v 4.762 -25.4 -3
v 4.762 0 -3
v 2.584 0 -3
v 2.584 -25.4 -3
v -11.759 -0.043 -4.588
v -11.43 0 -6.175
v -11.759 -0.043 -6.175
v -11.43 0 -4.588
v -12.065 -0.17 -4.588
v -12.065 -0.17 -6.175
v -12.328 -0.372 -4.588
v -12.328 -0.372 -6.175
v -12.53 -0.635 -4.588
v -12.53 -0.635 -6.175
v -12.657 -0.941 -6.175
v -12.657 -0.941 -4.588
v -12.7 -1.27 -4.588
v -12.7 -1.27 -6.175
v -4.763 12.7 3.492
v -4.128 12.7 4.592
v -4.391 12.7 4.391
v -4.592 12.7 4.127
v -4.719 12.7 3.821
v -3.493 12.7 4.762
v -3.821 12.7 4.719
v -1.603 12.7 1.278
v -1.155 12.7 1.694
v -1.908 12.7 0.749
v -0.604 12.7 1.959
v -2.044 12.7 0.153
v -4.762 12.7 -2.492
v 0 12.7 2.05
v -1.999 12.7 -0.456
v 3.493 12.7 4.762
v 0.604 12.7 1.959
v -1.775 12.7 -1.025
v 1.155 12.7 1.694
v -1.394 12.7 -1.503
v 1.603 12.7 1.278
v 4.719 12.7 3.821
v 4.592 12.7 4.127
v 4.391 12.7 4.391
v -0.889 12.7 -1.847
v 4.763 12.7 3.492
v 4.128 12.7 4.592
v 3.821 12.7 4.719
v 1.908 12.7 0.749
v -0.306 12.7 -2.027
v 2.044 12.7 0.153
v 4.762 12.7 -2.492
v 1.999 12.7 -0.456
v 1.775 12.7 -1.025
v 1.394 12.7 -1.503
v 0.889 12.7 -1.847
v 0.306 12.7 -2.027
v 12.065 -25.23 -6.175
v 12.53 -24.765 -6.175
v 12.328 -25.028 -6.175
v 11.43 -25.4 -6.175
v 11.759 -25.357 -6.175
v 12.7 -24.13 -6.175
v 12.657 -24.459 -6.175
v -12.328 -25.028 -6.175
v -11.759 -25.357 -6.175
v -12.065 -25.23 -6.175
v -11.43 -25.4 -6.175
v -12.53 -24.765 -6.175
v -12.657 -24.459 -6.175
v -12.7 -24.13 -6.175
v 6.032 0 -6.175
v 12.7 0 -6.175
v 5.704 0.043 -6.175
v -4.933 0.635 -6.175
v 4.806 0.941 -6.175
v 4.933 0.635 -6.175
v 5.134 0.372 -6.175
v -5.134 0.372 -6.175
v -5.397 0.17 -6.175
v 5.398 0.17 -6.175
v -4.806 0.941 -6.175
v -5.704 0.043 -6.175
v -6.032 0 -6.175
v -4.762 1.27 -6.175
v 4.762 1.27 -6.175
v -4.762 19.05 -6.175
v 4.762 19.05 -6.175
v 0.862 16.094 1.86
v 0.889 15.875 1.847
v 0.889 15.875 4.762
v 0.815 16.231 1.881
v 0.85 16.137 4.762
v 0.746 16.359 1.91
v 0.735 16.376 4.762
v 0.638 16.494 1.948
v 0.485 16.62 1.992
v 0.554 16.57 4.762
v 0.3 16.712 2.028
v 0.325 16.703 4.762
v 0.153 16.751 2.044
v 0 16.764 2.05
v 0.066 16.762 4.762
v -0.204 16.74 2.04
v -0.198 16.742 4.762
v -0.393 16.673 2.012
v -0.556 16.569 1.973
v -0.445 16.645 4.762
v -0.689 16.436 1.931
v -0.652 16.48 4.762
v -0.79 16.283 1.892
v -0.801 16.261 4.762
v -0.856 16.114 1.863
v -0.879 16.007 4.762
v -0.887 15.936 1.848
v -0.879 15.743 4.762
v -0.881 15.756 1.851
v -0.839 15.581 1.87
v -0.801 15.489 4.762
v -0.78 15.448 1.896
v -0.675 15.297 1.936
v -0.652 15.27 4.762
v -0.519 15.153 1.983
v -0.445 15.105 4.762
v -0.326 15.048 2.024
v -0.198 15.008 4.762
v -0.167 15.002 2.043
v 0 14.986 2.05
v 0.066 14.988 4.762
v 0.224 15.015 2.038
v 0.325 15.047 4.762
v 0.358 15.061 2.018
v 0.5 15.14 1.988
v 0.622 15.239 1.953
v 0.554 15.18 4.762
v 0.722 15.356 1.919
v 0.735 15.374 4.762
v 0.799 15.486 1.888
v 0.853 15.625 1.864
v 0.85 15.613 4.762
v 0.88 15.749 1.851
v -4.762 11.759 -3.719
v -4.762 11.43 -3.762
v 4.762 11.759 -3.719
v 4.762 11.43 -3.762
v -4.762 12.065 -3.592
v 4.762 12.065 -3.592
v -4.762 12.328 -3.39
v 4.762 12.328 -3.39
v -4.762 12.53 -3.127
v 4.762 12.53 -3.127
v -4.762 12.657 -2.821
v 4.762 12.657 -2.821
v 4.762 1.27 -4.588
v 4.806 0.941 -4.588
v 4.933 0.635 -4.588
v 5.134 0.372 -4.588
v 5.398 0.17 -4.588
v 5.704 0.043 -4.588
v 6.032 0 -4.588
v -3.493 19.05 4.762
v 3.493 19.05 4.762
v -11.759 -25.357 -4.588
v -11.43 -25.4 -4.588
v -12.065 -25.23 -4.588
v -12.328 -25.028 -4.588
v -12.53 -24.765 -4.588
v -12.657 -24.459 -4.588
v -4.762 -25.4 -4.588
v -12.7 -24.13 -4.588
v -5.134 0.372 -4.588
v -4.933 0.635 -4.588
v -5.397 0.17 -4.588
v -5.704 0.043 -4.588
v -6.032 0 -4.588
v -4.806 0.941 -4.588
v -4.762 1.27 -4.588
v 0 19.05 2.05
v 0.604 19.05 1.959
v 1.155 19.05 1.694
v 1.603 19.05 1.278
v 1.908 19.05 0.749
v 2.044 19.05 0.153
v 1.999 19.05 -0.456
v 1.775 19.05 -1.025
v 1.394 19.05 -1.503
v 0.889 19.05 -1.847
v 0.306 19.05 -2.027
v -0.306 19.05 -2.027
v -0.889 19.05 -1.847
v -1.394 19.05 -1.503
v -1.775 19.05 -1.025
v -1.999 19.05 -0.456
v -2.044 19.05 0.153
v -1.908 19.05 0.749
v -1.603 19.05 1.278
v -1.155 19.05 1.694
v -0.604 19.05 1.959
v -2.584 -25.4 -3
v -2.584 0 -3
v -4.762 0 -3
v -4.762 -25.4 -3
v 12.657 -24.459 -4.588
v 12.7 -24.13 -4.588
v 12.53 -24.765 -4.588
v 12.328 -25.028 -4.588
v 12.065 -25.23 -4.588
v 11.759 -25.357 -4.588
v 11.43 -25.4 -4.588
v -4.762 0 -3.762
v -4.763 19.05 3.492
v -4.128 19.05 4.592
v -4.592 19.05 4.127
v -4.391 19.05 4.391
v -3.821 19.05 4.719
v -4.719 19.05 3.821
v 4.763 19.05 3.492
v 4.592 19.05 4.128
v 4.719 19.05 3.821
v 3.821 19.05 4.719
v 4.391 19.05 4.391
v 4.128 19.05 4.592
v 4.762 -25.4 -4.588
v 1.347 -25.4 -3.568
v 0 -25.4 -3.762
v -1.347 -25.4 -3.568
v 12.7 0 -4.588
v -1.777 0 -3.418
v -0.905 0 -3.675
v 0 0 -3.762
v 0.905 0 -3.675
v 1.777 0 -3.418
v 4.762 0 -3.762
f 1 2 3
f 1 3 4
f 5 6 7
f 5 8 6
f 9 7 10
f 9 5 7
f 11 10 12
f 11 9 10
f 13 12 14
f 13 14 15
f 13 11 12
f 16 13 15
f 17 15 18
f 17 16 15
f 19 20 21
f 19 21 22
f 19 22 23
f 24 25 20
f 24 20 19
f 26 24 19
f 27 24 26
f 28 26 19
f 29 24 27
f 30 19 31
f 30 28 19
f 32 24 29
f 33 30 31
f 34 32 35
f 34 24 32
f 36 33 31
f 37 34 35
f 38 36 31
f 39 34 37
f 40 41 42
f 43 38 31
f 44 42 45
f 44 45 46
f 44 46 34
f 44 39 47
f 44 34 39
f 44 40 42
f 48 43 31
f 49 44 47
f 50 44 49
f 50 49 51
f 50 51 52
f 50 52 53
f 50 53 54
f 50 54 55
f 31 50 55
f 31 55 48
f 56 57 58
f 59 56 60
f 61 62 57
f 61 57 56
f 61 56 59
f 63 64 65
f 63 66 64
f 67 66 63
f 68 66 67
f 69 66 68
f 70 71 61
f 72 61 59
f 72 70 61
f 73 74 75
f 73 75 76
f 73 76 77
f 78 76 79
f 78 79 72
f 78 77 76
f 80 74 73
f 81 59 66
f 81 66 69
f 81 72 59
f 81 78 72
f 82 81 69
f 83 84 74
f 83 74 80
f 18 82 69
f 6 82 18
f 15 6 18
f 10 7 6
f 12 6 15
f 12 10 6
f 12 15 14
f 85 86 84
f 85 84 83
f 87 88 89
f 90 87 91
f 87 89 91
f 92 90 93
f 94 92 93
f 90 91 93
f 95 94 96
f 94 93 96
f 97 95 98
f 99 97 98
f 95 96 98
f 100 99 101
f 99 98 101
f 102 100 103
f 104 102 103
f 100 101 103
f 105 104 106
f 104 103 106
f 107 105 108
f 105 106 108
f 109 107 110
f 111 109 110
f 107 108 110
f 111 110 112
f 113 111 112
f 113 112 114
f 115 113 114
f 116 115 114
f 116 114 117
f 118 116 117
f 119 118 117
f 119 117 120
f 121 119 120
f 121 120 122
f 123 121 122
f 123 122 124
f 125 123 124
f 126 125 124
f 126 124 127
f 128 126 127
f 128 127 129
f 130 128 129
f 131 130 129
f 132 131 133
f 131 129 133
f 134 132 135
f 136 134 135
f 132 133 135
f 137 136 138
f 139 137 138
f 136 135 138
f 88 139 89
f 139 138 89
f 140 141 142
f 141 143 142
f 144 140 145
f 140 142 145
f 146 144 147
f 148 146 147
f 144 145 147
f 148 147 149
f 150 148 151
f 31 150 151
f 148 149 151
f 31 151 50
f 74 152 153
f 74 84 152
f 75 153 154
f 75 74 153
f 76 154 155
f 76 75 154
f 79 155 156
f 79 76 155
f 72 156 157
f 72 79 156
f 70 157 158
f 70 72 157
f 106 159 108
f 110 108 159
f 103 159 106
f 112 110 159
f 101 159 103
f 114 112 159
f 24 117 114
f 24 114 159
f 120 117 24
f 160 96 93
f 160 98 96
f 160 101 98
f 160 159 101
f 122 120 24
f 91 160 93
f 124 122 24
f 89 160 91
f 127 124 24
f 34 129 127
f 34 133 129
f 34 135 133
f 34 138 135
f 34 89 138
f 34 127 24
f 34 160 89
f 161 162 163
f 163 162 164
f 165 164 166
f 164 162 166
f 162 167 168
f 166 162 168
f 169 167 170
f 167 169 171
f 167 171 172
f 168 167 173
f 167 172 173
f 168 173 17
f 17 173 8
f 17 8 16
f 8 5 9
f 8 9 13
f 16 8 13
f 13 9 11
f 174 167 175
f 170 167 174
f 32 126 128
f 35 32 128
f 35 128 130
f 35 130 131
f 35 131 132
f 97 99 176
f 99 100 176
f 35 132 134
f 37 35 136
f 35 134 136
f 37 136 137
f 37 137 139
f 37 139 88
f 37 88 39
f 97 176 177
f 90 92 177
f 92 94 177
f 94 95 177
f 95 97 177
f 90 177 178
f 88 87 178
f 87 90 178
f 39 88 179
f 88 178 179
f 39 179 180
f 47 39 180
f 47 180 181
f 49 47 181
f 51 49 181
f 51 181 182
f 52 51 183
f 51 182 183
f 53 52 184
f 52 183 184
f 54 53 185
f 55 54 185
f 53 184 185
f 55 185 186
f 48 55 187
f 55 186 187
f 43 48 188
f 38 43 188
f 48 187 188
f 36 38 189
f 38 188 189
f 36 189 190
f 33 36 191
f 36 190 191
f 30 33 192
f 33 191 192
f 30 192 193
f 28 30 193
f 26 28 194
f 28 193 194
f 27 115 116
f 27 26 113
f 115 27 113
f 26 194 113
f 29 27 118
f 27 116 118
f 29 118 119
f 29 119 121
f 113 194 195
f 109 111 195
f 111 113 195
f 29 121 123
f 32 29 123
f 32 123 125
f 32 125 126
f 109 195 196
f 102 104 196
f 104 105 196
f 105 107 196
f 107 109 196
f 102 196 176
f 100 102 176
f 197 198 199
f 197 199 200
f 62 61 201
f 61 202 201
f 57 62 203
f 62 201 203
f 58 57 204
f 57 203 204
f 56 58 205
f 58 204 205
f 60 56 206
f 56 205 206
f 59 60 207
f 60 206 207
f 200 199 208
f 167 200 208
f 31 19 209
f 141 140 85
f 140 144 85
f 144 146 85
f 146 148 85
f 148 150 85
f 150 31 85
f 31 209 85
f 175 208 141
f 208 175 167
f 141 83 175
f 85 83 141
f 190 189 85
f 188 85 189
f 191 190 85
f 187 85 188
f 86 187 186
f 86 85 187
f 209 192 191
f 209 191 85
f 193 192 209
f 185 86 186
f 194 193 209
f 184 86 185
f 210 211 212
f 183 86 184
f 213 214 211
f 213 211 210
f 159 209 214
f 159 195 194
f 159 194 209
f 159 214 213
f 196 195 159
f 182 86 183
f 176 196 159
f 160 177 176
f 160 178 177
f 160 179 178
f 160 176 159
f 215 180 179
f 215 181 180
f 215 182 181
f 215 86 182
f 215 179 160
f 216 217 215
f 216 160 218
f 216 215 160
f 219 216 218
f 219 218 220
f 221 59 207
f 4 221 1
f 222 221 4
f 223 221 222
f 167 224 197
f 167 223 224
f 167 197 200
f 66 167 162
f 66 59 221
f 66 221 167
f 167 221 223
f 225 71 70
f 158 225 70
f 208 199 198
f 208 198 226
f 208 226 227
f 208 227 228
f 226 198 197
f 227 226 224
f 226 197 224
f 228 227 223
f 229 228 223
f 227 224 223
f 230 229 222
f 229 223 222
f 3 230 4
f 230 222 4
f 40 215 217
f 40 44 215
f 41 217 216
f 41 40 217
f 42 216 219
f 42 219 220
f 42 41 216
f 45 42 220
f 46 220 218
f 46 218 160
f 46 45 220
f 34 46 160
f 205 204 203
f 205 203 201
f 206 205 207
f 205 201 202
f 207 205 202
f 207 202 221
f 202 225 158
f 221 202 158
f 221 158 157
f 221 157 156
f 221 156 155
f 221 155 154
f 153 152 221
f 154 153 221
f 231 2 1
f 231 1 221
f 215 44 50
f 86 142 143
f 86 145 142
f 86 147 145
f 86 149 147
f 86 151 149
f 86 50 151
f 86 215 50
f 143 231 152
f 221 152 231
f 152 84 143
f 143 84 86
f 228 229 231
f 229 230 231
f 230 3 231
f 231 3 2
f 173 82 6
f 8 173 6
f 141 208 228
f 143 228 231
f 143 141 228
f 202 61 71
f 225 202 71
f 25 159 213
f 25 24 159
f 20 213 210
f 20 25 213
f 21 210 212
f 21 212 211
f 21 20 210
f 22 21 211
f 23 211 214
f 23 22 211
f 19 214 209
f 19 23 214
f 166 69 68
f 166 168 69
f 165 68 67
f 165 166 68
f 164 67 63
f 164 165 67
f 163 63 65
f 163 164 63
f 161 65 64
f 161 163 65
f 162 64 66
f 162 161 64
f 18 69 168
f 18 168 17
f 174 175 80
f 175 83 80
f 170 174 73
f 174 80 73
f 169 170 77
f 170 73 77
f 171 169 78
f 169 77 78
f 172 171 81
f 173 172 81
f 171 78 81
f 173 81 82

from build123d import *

# Parameters (mm, degrees)
BOSS_EXTRUDE1_DEPTH        = 4.7625
SKETCH3_R                  = 2.05
CUT_EXTRUDE1_DEPTH         = 46.128865832
SKETCH4_R                  = 4.7625
CUT_EXTRUDE2_DEPTH         = 38.1
SKETCH5_W                  = 25.4
SKETCH5_H                  = 25.4
BOSS_EXTRUDE2_DEPTH        = 1.5875
SKETCH6_W                  = 23.891441553
SKETCH6_H                  = 12.7
CUT_EXTRUDE3_DEPTH         = 0.762
FILLET1_R                  = 1.27
F_2_56_TAPPED_HOLE1_REACH  = 32.432
F_2_56_TAPPED_HOLE1_BORE_R = 0.889


with BuildPart() as part:
    # Sketch2 → Boss-Extrude1 (new, symmetric)
    with BuildSketch(Plane(origin=(0, 0, 0), x_dir=(0, 0, -1), z_dir=(1, 0, 0))):
        Polygon((-4.7625, 12.7), (3, 12.7), (3, -25.4), (6.175, -25.4), (6.175, 19.05), (-4.7625, 19.05), align=None)
    extrude(amount=BOSS_EXTRUDE1_DEPTH, both=True)

    # Sketch3 → Cut-Extrude1 (cut, through all)
    with BuildSketch(Plane(origin=(0, 19.05, 0), x_dir=(1, 0, 0), z_dir=(0, 1, 0))):
        with Locations(Location((0, 0, 0), (0, 0, 270))):
            Circle(SKETCH3_R)
    extrude(amount=-CUT_EXTRUDE1_DEPTH, mode=Mode.SUBTRACT)

    # Sketch4 → Cut-Extrude2 (cut)
    with BuildSketch(Plane.XZ.offset(25.4)):
        with Locations((0, 1.0005)):
            Circle(SKETCH4_R)
    extrude(amount=-CUT_EXTRUDE2_DEPTH, mode=Mode.SUBTRACT)

    # Sketch5 → Boss-Extrude2 (add)
    with BuildSketch(Plane(origin=(0, 0, -6.175), x_dir=(-1, 0, 0), z_dir=(0, 0, -1))):
        with Locations((0, -12.7)):
            Rectangle(SKETCH5_W, SKETCH5_H)
    extrude(amount=-BOSS_EXTRUDE2_DEPTH)

    # Sketch6 → Cut-Extrude3 (cut)
    with BuildSketch(Plane.XY.offset(-3)):
        with Locations((3.216659965, 6.35)):
            Rectangle(SKETCH6_W, SKETCH6_H)
    extrude(amount=-CUT_EXTRUDE3_DEPTH, mode=Mode.SUBTRACT)

    # Fillet1
    fillet1_edges = [part.edges().sort_by_distance(p)[0] for p in [
        (4.7625, 15.875, 4.7625),
        (-4.7625, 0, -5.38125),
        (-12.7, -25.4, -5.38125),
        (-12.7, 0, -5.38125),
        (12.7, -25.4, -5.38125),
        (4.7625, 0, -5.38125),
        (0, 12.7, -3.762),
        (-4.7625, 15.875, 4.7625),
    ]]
    fillet(fillet1_edges, radius=FILLET1_R)

    # #2-56 Tapped Hole1 bore → #2-56 Tapped Hole1 (cut, up to next)
    with BuildSketch(Plane.XY.offset(4.7625), mode=Mode.PRIVATE) as f_2_56_tapped_hole1_sk1:
        with Locations((0, 15.875)):
            Circle(F_2_56_TAPPED_HOLE1_BORE_R)
    f_2_56_tapped_hole1_tool1 = extrude(f_2_56_tapped_hole1_sk1.sketch, amount=-F_2_56_TAPPED_HOLE1_REACH, mode=Mode.PRIVATE) & part.part
    add(f_2_56_tapped_hole1_tool1.solids().sort_by_distance((0, 15.875, 4.7625))[0], mode=Mode.SUBTRACT)


solid = part.part
